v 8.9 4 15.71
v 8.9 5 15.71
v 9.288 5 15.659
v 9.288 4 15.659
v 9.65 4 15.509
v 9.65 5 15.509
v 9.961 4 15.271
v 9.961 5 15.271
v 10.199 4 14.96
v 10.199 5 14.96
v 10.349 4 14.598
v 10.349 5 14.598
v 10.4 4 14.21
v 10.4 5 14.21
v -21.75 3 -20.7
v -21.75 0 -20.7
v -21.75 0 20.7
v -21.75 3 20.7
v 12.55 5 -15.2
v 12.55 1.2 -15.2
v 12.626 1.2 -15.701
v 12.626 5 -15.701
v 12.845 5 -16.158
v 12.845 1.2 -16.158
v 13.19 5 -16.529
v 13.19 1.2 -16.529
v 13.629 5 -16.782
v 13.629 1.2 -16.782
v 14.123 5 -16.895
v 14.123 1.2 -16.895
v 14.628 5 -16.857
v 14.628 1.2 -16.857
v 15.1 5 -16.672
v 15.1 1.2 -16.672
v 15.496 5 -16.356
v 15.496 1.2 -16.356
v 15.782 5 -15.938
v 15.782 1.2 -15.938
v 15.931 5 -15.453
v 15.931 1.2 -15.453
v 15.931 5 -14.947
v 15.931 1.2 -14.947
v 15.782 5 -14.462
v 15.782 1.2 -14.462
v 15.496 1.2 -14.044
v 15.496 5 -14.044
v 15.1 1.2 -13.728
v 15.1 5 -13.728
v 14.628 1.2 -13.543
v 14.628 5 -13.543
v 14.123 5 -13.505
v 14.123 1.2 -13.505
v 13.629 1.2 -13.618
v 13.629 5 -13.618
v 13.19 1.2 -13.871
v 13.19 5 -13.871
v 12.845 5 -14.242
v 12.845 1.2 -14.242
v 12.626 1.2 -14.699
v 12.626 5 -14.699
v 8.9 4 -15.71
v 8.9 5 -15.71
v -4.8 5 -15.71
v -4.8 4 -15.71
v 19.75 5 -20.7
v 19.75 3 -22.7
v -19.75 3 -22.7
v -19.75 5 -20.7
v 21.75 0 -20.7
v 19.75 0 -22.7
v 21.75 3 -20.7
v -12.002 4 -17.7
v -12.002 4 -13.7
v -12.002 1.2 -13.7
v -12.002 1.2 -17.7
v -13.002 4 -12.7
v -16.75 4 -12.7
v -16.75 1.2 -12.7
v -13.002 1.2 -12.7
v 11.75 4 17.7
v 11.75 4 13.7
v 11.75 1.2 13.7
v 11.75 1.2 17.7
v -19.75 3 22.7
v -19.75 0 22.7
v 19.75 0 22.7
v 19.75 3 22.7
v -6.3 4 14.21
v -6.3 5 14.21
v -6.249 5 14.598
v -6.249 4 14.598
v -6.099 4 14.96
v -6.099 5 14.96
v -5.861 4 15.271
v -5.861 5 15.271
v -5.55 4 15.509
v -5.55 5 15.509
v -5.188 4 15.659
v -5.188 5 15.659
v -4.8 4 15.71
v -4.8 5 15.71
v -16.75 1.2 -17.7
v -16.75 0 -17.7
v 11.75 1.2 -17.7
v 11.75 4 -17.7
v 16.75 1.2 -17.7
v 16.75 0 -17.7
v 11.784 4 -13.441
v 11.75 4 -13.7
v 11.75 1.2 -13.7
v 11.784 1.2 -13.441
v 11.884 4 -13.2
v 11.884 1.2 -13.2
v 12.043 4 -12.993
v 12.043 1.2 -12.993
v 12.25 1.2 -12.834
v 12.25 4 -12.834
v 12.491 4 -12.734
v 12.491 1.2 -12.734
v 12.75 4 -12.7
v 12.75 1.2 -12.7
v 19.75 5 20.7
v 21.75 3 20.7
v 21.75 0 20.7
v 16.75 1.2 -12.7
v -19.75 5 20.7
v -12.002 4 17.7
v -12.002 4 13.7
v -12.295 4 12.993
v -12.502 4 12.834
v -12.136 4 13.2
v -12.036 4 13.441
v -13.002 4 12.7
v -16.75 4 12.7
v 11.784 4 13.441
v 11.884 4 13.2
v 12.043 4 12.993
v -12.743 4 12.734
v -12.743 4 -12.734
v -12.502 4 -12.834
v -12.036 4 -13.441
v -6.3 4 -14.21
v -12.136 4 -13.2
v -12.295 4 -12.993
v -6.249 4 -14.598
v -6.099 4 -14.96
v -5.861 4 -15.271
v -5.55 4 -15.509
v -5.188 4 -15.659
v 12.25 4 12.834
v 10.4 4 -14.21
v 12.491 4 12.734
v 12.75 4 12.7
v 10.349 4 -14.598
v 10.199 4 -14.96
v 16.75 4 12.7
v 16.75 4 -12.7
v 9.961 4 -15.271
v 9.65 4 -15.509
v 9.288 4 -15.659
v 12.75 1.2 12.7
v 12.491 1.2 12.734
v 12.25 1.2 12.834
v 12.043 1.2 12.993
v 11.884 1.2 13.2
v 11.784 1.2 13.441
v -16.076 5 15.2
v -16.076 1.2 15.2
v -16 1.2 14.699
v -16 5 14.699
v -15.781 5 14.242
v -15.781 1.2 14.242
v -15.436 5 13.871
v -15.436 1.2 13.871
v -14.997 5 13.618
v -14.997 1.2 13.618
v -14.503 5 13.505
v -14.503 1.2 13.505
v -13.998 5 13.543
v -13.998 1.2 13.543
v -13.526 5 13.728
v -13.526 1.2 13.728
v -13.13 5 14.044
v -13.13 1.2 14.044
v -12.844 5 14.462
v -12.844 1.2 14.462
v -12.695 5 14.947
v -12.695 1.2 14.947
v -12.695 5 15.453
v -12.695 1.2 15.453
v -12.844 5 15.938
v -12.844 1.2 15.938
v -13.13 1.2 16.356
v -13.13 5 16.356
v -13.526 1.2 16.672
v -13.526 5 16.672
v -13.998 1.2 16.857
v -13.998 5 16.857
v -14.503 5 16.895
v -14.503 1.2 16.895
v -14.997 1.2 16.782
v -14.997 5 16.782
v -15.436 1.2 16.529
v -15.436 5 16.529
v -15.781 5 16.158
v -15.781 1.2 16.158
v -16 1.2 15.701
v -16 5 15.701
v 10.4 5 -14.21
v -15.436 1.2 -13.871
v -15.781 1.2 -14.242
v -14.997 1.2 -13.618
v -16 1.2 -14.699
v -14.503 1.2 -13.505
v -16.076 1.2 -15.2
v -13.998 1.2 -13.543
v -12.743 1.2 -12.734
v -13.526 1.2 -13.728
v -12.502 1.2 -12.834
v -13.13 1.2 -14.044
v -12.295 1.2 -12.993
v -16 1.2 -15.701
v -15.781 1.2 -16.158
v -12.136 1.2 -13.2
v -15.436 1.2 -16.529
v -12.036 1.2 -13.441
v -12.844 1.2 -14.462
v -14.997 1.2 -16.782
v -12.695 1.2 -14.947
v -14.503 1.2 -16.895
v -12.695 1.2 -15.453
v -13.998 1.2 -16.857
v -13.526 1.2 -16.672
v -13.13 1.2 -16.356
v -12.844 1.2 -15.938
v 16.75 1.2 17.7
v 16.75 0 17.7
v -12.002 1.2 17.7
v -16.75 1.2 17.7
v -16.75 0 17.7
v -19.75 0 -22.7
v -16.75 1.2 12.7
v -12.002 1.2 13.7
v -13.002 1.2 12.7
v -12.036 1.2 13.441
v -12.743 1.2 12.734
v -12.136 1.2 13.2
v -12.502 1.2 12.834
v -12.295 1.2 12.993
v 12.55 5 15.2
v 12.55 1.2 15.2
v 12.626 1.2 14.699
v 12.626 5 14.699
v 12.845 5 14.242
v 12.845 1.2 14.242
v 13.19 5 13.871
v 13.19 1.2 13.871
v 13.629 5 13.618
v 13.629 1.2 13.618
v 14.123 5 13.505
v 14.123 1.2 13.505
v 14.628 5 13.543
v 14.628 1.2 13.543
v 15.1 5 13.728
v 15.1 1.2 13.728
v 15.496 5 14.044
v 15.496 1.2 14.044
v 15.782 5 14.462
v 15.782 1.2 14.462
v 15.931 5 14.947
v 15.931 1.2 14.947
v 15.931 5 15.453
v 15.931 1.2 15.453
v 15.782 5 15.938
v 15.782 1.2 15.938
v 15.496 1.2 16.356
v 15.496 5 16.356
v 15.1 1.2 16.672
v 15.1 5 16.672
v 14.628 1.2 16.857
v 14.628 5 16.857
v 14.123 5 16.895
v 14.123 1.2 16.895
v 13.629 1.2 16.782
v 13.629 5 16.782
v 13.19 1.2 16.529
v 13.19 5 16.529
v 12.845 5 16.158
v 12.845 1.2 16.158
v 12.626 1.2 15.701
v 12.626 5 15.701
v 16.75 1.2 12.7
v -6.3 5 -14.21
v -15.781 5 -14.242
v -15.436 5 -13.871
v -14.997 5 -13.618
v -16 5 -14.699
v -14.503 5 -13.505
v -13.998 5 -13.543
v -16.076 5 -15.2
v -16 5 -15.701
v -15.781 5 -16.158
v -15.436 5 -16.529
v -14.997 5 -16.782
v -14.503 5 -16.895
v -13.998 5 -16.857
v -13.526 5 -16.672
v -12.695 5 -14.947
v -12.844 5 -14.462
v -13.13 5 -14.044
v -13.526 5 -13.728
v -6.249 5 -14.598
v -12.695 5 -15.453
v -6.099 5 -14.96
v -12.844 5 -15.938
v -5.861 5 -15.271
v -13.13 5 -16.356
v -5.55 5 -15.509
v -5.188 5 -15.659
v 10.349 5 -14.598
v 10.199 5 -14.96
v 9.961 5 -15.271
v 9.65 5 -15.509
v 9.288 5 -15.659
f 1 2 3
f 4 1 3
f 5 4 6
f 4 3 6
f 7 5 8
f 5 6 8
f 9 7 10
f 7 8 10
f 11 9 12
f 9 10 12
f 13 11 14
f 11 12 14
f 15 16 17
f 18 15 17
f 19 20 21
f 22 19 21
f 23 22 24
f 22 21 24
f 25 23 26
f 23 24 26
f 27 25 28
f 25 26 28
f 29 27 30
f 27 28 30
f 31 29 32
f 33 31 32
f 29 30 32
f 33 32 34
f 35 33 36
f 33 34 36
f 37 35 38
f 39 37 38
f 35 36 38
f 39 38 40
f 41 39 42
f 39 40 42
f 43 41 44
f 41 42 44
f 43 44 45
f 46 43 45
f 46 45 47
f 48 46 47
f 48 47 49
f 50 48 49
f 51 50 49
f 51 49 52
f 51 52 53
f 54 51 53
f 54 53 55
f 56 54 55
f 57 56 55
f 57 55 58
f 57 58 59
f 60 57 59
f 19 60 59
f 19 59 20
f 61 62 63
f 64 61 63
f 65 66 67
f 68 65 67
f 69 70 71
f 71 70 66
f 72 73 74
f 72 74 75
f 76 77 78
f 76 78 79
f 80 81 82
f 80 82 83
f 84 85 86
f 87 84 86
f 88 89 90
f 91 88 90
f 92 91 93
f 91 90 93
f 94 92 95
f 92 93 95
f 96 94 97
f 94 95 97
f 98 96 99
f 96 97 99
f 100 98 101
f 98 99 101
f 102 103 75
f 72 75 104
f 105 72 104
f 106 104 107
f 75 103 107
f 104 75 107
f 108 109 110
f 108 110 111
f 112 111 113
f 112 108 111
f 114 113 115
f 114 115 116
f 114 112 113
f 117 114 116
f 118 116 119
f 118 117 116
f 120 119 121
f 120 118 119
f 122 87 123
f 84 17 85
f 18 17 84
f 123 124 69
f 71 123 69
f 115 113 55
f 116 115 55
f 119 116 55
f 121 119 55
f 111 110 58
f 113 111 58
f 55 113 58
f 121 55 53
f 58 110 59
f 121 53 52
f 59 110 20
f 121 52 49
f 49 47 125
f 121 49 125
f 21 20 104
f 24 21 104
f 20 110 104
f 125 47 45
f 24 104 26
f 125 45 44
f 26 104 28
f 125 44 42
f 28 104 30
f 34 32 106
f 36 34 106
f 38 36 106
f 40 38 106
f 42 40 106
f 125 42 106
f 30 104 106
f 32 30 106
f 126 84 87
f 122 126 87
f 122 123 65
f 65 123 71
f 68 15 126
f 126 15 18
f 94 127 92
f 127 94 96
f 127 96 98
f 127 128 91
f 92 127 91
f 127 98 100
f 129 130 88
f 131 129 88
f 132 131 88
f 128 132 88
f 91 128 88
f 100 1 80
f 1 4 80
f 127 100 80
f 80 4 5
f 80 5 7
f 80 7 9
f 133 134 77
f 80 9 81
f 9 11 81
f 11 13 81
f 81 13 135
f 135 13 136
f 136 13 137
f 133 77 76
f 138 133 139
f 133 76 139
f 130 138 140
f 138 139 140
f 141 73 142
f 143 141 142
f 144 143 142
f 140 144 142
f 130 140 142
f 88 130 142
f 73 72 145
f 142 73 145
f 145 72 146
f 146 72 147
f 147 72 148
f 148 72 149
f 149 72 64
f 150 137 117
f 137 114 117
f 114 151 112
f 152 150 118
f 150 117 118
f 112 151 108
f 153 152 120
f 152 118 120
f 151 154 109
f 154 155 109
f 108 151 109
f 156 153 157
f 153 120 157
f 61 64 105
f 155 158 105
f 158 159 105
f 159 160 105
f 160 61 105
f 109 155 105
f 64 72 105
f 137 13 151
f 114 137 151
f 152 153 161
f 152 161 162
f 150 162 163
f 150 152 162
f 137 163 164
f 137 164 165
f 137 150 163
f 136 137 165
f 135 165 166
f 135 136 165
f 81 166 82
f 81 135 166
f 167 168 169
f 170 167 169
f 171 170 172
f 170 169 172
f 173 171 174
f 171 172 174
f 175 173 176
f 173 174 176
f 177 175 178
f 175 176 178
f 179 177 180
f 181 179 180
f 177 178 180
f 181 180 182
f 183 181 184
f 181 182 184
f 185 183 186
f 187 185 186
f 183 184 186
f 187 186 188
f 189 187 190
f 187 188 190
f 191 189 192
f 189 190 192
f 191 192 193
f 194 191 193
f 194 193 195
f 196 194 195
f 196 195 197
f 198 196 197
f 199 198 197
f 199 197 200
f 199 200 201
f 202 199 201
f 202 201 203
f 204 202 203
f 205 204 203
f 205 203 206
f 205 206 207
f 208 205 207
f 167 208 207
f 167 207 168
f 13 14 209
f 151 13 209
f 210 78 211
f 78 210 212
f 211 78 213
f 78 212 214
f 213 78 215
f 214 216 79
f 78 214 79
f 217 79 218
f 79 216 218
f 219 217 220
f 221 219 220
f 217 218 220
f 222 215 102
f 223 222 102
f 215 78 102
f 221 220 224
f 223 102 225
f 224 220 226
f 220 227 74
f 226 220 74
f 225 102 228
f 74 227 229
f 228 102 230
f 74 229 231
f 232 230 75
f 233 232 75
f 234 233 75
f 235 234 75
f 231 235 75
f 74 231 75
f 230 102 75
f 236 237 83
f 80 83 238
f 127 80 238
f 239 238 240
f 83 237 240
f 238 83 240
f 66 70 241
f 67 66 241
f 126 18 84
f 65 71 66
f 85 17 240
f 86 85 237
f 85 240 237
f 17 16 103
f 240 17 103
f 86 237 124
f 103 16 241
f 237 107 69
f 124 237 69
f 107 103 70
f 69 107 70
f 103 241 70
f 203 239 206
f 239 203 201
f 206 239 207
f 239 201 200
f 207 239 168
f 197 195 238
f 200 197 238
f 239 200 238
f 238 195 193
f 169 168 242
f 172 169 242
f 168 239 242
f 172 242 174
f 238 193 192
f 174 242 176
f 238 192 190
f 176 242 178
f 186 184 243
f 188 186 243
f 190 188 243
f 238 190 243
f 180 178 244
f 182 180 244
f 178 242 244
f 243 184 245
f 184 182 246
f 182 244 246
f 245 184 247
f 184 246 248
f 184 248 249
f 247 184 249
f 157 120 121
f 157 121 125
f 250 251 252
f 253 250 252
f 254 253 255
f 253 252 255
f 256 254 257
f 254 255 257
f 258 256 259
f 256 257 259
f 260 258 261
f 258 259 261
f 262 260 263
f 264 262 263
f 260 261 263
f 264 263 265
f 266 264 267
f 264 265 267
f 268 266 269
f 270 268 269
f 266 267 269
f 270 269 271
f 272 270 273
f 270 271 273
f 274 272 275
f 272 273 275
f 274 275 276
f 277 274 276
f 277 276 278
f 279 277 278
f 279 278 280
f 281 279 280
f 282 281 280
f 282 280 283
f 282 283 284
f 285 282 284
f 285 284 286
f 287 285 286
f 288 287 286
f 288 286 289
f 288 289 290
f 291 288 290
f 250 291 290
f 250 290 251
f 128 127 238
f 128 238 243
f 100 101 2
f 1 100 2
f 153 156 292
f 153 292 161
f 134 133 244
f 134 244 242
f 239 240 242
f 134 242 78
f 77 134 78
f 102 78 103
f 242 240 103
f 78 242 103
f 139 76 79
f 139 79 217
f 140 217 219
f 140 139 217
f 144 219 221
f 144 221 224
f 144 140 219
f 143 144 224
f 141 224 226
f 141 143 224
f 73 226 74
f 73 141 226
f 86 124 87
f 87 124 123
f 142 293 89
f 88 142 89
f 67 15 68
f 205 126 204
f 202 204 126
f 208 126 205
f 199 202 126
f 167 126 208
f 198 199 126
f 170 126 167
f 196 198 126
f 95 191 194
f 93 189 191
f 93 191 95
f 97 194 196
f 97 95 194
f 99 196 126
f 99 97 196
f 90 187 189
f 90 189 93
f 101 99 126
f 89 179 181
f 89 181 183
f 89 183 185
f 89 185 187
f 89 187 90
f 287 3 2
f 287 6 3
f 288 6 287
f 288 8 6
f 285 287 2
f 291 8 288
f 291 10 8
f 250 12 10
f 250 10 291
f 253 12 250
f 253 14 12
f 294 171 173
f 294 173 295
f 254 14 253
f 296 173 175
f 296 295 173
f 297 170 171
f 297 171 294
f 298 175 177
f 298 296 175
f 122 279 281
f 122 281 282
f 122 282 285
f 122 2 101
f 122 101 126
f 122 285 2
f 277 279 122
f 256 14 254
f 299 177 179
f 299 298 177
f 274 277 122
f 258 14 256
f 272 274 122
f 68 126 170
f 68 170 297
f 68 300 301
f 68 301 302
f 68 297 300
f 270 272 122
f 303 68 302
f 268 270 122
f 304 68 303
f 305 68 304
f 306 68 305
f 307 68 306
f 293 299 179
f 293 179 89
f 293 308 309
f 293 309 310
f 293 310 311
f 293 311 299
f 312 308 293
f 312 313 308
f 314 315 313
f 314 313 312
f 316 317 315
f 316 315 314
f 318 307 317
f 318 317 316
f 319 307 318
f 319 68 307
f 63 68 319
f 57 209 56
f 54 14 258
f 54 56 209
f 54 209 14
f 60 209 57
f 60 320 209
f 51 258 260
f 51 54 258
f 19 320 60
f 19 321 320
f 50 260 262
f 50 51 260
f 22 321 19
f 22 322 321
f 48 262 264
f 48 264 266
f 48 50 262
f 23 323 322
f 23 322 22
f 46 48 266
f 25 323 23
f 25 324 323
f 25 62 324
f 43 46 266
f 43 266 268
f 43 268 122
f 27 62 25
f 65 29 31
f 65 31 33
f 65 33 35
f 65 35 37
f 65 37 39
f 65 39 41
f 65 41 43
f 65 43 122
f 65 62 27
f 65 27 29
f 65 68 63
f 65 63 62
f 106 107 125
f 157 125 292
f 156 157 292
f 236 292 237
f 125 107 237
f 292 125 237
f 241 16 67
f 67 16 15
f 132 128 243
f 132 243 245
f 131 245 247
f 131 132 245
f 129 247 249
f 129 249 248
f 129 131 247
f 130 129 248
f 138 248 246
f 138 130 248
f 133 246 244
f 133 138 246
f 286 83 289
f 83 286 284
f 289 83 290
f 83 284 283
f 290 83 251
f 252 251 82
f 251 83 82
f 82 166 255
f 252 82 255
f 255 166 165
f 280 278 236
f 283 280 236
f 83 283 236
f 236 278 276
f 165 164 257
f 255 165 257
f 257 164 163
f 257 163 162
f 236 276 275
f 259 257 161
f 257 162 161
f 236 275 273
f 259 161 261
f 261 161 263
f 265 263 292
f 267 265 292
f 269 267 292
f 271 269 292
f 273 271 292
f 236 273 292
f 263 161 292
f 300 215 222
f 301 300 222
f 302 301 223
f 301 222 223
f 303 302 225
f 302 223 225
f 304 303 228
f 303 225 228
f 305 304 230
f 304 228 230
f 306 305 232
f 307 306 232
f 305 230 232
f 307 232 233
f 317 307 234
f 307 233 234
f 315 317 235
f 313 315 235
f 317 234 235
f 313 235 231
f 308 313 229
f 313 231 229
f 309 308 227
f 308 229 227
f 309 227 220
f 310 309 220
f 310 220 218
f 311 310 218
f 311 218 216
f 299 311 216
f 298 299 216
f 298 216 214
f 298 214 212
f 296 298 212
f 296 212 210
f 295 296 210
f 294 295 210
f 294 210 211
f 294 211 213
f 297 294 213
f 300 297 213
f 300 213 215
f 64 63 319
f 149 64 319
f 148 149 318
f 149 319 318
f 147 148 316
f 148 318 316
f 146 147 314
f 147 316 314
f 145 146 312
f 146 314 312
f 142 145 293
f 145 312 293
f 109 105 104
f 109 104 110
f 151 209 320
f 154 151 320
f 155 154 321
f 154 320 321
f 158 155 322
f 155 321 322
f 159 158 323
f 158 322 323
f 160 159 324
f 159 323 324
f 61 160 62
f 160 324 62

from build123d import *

# Parameters (mm, degrees)
EXTRUDE_2_DEPTH   = 5
EXTRUDE_3_DEPTH   = 3.8
EXTRUDE_4_DEPTH   = 1
CHAMFER_1_SIZE    = 2
HOLE_WIZARD_M31_D = 3.4


with BuildPart() as part:
    # Эскиз2 → Бобышка-Вытянуть2 (new body)
    with BuildSketch(Plane(origin=(0, 0, 0), x_dir=(1, 0, 0), z_dir=(0, 1, 0))):
        Polygon((-21.75, 7), (-21.75, -7), (-21.75, -11.7), (-21.75, -22.7), (21.75, -22.7), (21.75, 22.7), (-21.75, 22.7), (-21.75, 11.7), align=None)
        Polygon((-16.75, 17.7), (16.75, 17.7), (16.75, -17.7), (-16.75, -17.7), (-16.75, -11.7), (-16.75, -7), (-16.75, 7), (-16.75, 11.7), align=None, mode=Mode.SUBTRACT)
    extrude(amount=EXTRUDE_2_DEPTH)

    # Эскиз3 → Бобышка-Вытянуть3 (add)
    with BuildSketch(Plane(origin=(0, 5, 0), x_dir=(1, 0, 0), z_dir=(0, 1, 0))):
        with BuildLine():
            Line((-16.75, 17.7), (-16.75, 12.7))
            Line((-16.75, 12.7), (-15.75, 12.7))
            Line((-15.75, 12.7), (-13.001919935, 12.7))
            ThreePointArc((-13.001919935, 12.7), (-12.294813154, 12.992893219), (-12.001919935, 13.7))
            Line((-12.001919935, 13.7), (-12.001919935, 16.7))
            Line((-12.001919935, 16.7), (-12.001919935, 17.7))
            Line((-12.001919935, 17.7), (-16.75, 17.7))
        make_face()
        with BuildLine():
            Line((15.75, 12.7), (16.75, 12.7))
            Line((16.75, 12.7), (16.75, 17.7))
            Line((16.75, 17.7), (11.75, 17.7))
            Line((11.75, 17.7), (11.75, 16.7))
            Line((11.75, 16.7), (11.75, 13.7))
            ThreePointArc((11.75, 13.7), (12.042893219, 12.992893219), (12.75, 12.7))
            Line((12.75, 12.7), (15.75, 12.7))
        make_face()
        with BuildLine():
            Line((11.75, -16.7), (11.75, -17.7))
            Line((11.75, -17.7), (16.75, -17.7))
            Line((16.75, -17.7), (16.75, -12.7))
            Line((16.75, -12.7), (15.75, -12.7))
            Line((15.75, -12.7), (12.75, -12.7))
            ThreePointArc((12.75, -12.7), (12.042893219, -12.992893219), (11.75, -13.7))
            Line((11.75, -13.7), (11.75, -16.7))
        make_face()
        with BuildLine():
            Line((-12.001919935, -16.7), (-12.001919935, -13.7))
            ThreePointArc((-12.001919935, -13.7), (-12.294813154, -12.992893219), (-13.001919935, -12.7))
            Line((-13.001919935, -12.7), (-15.75, -12.7))
            Line((-15.75, -12.7), (-16.75, -12.7))
            Line((-16.75, -12.7), (-16.75, -17.7))
            Line((-16.75, -17.7), (-12.001919935, -17.7))
            Line((-12.001919935, -17.7), (-12.001919935, -16.7))
        make_face()
    extrude(amount=-EXTRUDE_3_DEPTH)

    # Эскиз4 → Бобышка-Вытянуть4 (add)
    with BuildSketch(Plane(origin=(0, 5, 0), x_dir=(1, 0, 0), z_dir=(0, 1, 0))):
        with BuildLine():
            Line((-16.75, -12.7), (-13.001919935, -12.7))
            ThreePointArc((-13.001919935, -12.7), (-12.294813154, -12.992893219), (-12.001919935, -13.7))
            Line((-12.001919935, -13.7), (-12.001919935, -17.7))
            Line((-12.001919935, -17.7), (11.75, -17.7))
            Line((11.75, -17.7), (11.75, -13.7))
            ThreePointArc((11.75, -13.7), (12.042893219, -12.992893219), (12.75, -12.7))
            Line((12.75, -12.7), (16.75, -12.7))
            Line((16.75, -12.7), (16.75, 12.7))
            Line((16.75, 12.7), (12.75, 12.7))
            ThreePointArc((12.75, 12.7), (12.042893219, 12.992893219), (11.75, 13.7))
            Line((11.75, 13.7), (11.75, 17.7))
            Line((11.75, 17.7), (-12.001919935, 17.7))
            Line((-12.001919935, 17.7), (-12.001919935, 13.7))
            ThreePointArc((-12.001919935, 13.7), (-12.294813154, 12.992893219), (-13.001919935, 12.7))
            Line((-13.001919935, 12.7), (-16.75, 12.7))
            Line((-16.75, 12.7), (-16.75, -12.7))
        make_face()
        with BuildLine():
            Line((-4.8, -15.71), (8.9, -15.71))
            ThreePointArc((8.9, -15.71), (9.960660172, -15.270660172), (10.4, -14.21))
            Line((10.4, -14.21), (10.4, 14.21))
            ThreePointArc((10.4, 14.21), (9.960660172, 15.270660172), (8.9, 15.71))
            Line((8.9, 15.71), (-4.8, 15.71))
            ThreePointArc((-4.8, 15.71), (-5.860660172, 15.270660172), (-6.3, 14.21))
            Line((-6.3, 14.21), (-6.3, -14.21))
            ThreePointArc((-6.3, -14.21), (-5.860660172, -15.270660172), (-4.8, -15.71))
        make_face(mode=Mode.SUBTRACT)
    extrude(amount=-EXTRUDE_4_DEPTH)

    # Фаска1
    chamfer_1_edges = [part.edges().sort_by_distance(p)[0] for p in [
        (-21.75, 2.5, -22.7),
        (21.75, 2.5, -22.7),
        (21.75, 2.5, 22.7),
        (-21.75, 2.5, 22.7),
        (-21.75, 5, 0),
        (0, 5, 22.7),
        (21.75, 5, 0),
        (0, 5, -22.7),
    ]]
    chamfer(chamfer_1_edges, length=CHAMFER_1_SIZE)

    # Отверстие с зазором M31 (through all)
    with Locations(Plane(origin=(0, 5, 0), x_dir=(1, 0, 0), z_dir=(0, 1, 0))):
        with Locations((14.25, -15.2), (14.25, 15.2), (-14.375959967, 15.2), (-14.375959967, -15.2)):
            Hole(HOLE_WIZARD_M31_D / 2)


solid = part.part
